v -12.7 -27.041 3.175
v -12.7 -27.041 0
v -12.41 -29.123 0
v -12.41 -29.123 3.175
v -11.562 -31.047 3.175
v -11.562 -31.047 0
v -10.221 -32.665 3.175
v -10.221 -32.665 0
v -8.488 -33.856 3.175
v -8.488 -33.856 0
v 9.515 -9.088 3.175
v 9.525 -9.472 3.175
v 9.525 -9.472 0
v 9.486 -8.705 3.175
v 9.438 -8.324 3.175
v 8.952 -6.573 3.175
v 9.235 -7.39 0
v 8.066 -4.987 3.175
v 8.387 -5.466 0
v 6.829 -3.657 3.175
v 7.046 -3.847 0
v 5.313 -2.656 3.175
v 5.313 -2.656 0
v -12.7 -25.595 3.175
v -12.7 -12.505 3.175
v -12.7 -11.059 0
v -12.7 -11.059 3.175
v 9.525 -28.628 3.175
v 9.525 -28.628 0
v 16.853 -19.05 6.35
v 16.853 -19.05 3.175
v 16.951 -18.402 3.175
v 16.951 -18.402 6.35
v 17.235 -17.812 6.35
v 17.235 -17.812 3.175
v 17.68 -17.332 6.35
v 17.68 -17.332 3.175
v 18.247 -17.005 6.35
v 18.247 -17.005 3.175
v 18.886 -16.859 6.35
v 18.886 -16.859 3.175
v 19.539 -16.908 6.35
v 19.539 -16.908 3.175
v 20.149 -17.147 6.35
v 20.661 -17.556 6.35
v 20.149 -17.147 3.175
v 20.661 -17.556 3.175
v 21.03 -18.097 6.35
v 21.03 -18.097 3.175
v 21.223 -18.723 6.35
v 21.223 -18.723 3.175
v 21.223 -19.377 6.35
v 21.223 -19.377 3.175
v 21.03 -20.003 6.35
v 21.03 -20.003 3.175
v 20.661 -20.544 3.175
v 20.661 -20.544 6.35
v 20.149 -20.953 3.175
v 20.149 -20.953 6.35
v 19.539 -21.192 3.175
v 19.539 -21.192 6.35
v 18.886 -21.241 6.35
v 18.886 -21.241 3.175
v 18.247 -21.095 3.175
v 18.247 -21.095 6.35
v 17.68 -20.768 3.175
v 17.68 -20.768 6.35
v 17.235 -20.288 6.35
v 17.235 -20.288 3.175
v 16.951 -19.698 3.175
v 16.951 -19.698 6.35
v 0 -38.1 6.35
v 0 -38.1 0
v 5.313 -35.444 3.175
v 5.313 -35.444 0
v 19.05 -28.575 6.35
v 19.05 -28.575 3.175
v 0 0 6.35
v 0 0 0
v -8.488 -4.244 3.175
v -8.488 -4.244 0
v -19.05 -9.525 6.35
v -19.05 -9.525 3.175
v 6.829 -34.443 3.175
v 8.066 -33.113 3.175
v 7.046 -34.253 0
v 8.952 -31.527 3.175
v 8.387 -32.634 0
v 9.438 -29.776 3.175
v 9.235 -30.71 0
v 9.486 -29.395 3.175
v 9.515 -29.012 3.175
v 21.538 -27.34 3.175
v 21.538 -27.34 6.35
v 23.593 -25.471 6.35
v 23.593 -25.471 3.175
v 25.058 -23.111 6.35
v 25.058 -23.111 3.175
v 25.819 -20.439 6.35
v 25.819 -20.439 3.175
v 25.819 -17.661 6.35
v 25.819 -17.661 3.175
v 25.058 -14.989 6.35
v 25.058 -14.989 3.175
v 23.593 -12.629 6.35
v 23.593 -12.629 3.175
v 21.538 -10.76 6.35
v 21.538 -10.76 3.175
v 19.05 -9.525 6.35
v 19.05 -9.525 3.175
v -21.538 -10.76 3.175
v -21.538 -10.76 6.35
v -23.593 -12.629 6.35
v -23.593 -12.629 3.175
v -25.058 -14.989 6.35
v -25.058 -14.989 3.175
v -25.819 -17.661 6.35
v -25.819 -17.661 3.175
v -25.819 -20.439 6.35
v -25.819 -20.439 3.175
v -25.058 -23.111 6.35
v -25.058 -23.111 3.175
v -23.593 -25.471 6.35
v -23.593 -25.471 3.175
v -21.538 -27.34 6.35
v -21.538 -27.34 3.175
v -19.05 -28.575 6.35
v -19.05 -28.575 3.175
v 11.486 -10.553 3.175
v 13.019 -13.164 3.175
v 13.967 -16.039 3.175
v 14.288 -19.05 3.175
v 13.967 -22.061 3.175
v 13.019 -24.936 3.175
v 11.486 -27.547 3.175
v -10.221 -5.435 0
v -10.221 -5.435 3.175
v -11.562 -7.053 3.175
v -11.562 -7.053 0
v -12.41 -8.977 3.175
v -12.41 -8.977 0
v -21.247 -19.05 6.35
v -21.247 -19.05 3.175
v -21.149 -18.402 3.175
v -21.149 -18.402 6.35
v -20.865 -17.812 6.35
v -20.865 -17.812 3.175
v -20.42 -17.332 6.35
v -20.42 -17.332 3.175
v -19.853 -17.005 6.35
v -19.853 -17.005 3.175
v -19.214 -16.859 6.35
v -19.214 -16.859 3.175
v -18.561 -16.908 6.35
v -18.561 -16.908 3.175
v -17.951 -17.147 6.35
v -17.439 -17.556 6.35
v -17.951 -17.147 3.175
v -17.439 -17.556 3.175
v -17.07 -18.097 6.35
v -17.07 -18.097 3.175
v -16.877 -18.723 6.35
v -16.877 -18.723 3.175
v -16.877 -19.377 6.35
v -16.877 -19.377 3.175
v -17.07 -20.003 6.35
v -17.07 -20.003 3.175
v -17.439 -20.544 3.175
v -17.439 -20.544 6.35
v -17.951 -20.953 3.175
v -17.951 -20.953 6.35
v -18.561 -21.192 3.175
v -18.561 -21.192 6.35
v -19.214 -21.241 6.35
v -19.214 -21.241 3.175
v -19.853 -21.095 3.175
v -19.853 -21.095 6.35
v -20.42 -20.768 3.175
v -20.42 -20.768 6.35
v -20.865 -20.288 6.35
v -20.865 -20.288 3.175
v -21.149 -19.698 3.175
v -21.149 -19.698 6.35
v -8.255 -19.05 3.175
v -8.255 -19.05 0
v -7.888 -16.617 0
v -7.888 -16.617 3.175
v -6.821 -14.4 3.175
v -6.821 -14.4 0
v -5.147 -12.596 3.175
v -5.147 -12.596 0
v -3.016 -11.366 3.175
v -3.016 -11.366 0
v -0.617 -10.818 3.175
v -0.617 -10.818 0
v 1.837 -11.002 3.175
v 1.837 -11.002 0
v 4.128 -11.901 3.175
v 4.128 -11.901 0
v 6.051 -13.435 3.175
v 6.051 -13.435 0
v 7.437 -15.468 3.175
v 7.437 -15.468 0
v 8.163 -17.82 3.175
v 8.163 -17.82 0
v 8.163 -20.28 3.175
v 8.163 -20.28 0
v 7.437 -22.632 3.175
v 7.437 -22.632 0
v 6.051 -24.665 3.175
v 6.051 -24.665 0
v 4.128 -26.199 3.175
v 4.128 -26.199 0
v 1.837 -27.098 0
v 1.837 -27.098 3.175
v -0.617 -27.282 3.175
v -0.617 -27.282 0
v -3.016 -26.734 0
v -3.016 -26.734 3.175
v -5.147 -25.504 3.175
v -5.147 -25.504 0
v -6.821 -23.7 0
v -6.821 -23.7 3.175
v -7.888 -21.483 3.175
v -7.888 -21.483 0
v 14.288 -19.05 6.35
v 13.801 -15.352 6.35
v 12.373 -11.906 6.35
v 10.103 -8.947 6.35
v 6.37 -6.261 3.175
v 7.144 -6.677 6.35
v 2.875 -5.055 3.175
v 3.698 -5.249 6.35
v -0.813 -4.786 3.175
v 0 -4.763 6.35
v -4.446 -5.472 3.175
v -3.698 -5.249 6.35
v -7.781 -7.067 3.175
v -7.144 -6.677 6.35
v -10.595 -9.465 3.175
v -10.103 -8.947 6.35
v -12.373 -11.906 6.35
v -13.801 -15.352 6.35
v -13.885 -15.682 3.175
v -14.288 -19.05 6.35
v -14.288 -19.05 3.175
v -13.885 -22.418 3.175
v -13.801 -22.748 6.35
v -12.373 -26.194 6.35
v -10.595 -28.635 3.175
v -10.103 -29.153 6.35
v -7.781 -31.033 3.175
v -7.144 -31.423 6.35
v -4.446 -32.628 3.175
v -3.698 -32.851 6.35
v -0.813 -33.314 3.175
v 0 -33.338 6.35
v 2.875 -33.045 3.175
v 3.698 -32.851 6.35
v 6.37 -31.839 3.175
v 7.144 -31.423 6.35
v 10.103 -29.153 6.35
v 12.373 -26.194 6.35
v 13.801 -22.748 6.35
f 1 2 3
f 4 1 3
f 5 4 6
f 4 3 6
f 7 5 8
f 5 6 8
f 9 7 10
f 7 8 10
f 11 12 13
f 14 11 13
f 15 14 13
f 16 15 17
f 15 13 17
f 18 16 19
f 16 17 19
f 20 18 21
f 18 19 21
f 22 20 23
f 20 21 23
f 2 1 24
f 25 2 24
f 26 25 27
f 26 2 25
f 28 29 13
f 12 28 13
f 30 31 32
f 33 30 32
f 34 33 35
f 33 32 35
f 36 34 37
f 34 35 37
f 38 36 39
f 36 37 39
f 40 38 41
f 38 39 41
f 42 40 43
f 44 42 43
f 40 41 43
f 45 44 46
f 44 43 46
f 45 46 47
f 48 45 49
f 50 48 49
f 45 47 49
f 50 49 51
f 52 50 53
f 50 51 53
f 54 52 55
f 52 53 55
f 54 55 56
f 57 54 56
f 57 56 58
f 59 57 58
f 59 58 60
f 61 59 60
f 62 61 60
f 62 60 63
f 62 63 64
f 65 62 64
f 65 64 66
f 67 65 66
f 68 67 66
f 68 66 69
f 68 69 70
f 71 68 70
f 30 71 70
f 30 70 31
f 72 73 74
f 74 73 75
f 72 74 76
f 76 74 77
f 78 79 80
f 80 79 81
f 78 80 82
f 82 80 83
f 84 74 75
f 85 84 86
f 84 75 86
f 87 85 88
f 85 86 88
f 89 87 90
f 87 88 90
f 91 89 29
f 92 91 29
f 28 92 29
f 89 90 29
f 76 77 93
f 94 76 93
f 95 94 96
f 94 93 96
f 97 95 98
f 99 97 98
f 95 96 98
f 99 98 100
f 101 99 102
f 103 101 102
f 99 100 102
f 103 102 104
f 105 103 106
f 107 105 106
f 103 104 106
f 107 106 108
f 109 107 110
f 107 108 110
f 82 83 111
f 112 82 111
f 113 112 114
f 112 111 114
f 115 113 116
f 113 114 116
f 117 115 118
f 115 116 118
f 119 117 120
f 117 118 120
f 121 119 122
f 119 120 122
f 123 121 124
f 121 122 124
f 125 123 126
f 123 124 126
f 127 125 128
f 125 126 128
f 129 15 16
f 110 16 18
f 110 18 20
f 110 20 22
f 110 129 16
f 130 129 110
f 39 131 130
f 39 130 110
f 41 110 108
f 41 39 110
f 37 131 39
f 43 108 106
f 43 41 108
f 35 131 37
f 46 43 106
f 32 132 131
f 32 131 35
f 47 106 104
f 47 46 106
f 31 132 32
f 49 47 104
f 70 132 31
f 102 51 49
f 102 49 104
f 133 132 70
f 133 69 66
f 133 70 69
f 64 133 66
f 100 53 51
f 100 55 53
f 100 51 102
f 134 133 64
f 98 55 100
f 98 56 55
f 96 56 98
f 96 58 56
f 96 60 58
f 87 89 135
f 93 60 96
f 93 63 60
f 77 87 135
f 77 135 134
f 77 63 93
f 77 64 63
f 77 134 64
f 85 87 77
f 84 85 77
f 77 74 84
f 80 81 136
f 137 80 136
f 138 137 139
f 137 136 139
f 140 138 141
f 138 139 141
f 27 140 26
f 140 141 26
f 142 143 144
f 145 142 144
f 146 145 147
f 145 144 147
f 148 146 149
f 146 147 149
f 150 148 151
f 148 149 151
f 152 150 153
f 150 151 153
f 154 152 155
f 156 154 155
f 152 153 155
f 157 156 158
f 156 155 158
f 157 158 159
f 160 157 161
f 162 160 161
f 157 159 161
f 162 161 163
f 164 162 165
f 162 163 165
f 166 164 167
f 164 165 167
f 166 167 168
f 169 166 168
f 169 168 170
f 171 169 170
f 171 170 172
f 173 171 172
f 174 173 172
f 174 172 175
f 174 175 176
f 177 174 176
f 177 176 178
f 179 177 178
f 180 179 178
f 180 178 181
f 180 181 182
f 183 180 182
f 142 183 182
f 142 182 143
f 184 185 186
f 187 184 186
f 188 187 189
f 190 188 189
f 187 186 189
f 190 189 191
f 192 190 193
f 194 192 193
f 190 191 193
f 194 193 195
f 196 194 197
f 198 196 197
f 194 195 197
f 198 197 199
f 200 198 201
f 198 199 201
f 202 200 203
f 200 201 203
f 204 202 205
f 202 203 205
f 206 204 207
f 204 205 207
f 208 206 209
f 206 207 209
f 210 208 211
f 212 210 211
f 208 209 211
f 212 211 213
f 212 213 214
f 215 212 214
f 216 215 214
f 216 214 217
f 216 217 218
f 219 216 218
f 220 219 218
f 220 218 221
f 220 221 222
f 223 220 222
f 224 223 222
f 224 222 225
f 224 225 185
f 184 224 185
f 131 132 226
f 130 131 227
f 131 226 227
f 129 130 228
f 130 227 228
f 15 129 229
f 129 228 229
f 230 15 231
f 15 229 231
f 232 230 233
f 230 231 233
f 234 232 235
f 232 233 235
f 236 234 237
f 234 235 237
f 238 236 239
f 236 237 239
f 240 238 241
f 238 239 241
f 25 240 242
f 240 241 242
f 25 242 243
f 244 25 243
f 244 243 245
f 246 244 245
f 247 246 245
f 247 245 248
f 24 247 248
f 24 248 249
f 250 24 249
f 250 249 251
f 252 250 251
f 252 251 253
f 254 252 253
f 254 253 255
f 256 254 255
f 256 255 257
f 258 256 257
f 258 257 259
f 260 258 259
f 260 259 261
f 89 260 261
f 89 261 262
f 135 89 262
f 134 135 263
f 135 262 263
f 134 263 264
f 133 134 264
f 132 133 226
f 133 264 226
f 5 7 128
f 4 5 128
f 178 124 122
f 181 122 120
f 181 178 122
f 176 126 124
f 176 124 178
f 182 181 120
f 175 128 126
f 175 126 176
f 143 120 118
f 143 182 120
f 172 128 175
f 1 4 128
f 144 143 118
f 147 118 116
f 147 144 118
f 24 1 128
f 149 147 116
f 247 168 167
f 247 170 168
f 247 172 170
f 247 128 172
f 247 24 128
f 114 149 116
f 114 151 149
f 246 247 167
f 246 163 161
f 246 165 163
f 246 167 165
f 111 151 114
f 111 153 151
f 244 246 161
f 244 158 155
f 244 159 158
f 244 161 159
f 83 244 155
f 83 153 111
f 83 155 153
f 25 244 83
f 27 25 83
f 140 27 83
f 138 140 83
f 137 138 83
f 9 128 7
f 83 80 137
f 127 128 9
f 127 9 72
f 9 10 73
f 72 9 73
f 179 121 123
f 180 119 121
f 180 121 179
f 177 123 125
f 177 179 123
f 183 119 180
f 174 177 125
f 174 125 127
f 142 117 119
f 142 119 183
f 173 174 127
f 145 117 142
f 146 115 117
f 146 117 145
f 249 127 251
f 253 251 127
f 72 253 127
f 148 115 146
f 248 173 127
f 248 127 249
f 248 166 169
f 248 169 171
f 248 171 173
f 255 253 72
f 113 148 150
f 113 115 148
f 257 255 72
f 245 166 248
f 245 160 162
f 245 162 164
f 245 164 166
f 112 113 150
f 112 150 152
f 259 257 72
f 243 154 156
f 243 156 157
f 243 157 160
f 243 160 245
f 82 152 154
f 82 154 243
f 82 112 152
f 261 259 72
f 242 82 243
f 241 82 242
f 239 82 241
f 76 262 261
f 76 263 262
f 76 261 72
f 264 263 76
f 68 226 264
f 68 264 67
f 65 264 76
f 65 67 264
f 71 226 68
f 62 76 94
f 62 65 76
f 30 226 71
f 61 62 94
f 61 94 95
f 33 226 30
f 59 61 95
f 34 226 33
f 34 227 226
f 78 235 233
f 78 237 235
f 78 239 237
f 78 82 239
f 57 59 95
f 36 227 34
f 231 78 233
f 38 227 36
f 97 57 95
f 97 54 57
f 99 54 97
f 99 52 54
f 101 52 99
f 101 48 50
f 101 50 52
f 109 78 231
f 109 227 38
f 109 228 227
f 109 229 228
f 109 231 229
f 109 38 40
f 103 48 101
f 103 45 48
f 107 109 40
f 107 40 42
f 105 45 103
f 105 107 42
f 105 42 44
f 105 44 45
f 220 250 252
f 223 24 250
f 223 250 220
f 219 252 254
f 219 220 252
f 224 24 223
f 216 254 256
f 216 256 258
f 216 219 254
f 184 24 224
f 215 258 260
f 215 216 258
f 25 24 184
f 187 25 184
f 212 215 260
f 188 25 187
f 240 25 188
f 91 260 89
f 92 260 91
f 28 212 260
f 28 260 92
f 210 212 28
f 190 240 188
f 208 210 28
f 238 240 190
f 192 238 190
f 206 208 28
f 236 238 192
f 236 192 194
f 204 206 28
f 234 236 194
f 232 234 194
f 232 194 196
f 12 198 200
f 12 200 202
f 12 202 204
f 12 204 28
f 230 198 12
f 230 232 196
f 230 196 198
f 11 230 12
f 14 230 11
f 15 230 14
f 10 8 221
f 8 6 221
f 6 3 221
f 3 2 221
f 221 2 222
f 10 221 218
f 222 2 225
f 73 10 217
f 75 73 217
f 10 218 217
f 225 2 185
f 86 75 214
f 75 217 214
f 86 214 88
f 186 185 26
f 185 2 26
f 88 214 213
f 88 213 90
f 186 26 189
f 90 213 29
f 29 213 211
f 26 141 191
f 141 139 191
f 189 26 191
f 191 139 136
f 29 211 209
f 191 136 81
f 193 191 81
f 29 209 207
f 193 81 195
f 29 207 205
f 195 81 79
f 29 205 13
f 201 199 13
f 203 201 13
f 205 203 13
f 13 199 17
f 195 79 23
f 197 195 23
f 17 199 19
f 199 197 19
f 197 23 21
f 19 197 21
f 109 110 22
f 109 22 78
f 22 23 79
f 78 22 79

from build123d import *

# Parameters (mm, degrees)
BOSS_EXTRUDE1_DEPTH         = 6.35
TAP_DRILL_FOR_8_HELICOIL2_D = 4.3942
SKETCH5_R                   = 14.2875
CUT_EXTRUDE1_DEPTH          = 3.175
SKETCH6_W                   = 13.215231571
SKETCH6_H                   = 25.4
SKETCH6_W_2                 = 16.390231571
SKETCH6_H_2                 = 28.575
CUT_EXTRUDE2_DEPTH          = 3.175
FILLET1_R                   = 7.62
SKETCH7_R                   = 8.255
CUT_EXTRUDE3_DEPTH          = 47.513779973


with BuildPart() as part:
    # Sketch2 → Boss-Extrude1 (new body)
    with BuildSketch(Plane.XY):
        with BuildLine():
            Line((0, 0), (-19.05, -9.525))
            ThreePointArc((-19.05, -9.525), (-25.915231571, -19.05), (-19.05, -28.575))
            Line((-19.05, -28.575), (0, -38.1))
            Line((0, -38.1), (19.05, -28.575))
            ThreePointArc((19.05, -28.575), (25.915231571, -19.05), (19.05, -9.525))
            Line((19.05, -9.525), (0, 0))
        make_face()
    extrude(amount=BOSS_EXTRUDE1_DEPTH)

    # Tap Drill for #8 Helicoil2 (through all)
    with Locations(Plane.XY.offset(6.35)):
        with Locations((-19.05, -19.05), (19.05, -19.05)):
            Hole(TAP_DRILL_FOR_8_HELICOIL2_D / 2)

    # Sketch5 → Cut-Extrude1 (cut)
    with BuildSketch(Plane.XY.offset(6.35)):
        with Locations((0, -19.05)):
            Circle(SKETCH5_R)
    extrude(amount=-CUT_EXTRUDE1_DEPTH, mode=Mode.SUBTRACT)

    # Sketch6 → Cut-Extrude2 (cut)
    with BuildSketch(Plane(origin=(0, 0, 0), x_dir=(-1, 0, 0), z_dir=(0, 0, -1))):
        with Locations((19.307615786, -19.05)):
            Rectangle(SKETCH6_W, SKETCH6_H)
        with Locations((-17.720115786, -19.05)):
            Rectangle(SKETCH6_W_2, SKETCH6_H_2)
    extrude(amount=-CUT_EXTRUDE2_DEPTH, mode=Mode.SUBTRACT)

    # Fillet1
    # the kernel refuses this fillet: 7.62 mm, written as the material it takes off along each edge
    with BuildSketch(Plane(origin=(-12.7, -31.75, -11.773547486), x_dir=(0.8944271909999157, -0.44721359549995826, 0), z_dir=(0, 0, 1)), Plane(origin=(-12.7, -6.35, -11.773547486), x_dir=(0, -1, 0), z_dir=(0, 0, 1)), Plane(origin=(9.525, -4.7625, -11.773547486), x_dir=(-0.894427190999916, 0.4472135954999576, 0), z_dir=(0, 0, 1))) as fillet1_piece_1:
        with BuildLine():
            CenterArc((FILLET1_R * 0.61803398875, FILLET1_R), FILLET1_R, 206.565051177, 63.434948823)
            Line((-FILLET1_R * 0.27639320225, FILLET1_R * 0.5527864045), (0, 0))
            Line((0, 0), (FILLET1_R * 0.61803398875, 0))
        make_face()
    extrude(amount=14.948547486, mode=Mode.SUBTRACT)
    with BuildSketch(Plane(origin=(9.525, -33.3375, -11.773547486), x_dir=(-0.8944271909999163, -0.4472135954999572, 0), z_dir=(0, 0, 1))) as fillet1_piece_2:
        with BuildLine():
            CenterArc((FILLET1_R * 0.61803398875, -FILLET1_R), FILLET1_R, 90, 63.434948823)
            Line((-FILLET1_R * 0.27639320225, -FILLET1_R * 0.5527864045), (0, 0))
            Line((0, 0), (FILLET1_R * 0.61803398875, 0))
        make_face()
    extrude(amount=14.948547486, mode=Mode.SUBTRACT)

    # Sketch7 → Cut-Extrude3 (cut, through all)
    with BuildSketch(Plane(origin=(0, 0, 0), x_dir=(-1, 0, 0), z_dir=(0, 0, -1))):
        with Locations((0, -19.05)):
            Circle(SKETCH7_R)
    extrude(amount=-CUT_EXTRUDE3_DEPTH, mode=Mode.SUBTRACT)


solid = part.part
